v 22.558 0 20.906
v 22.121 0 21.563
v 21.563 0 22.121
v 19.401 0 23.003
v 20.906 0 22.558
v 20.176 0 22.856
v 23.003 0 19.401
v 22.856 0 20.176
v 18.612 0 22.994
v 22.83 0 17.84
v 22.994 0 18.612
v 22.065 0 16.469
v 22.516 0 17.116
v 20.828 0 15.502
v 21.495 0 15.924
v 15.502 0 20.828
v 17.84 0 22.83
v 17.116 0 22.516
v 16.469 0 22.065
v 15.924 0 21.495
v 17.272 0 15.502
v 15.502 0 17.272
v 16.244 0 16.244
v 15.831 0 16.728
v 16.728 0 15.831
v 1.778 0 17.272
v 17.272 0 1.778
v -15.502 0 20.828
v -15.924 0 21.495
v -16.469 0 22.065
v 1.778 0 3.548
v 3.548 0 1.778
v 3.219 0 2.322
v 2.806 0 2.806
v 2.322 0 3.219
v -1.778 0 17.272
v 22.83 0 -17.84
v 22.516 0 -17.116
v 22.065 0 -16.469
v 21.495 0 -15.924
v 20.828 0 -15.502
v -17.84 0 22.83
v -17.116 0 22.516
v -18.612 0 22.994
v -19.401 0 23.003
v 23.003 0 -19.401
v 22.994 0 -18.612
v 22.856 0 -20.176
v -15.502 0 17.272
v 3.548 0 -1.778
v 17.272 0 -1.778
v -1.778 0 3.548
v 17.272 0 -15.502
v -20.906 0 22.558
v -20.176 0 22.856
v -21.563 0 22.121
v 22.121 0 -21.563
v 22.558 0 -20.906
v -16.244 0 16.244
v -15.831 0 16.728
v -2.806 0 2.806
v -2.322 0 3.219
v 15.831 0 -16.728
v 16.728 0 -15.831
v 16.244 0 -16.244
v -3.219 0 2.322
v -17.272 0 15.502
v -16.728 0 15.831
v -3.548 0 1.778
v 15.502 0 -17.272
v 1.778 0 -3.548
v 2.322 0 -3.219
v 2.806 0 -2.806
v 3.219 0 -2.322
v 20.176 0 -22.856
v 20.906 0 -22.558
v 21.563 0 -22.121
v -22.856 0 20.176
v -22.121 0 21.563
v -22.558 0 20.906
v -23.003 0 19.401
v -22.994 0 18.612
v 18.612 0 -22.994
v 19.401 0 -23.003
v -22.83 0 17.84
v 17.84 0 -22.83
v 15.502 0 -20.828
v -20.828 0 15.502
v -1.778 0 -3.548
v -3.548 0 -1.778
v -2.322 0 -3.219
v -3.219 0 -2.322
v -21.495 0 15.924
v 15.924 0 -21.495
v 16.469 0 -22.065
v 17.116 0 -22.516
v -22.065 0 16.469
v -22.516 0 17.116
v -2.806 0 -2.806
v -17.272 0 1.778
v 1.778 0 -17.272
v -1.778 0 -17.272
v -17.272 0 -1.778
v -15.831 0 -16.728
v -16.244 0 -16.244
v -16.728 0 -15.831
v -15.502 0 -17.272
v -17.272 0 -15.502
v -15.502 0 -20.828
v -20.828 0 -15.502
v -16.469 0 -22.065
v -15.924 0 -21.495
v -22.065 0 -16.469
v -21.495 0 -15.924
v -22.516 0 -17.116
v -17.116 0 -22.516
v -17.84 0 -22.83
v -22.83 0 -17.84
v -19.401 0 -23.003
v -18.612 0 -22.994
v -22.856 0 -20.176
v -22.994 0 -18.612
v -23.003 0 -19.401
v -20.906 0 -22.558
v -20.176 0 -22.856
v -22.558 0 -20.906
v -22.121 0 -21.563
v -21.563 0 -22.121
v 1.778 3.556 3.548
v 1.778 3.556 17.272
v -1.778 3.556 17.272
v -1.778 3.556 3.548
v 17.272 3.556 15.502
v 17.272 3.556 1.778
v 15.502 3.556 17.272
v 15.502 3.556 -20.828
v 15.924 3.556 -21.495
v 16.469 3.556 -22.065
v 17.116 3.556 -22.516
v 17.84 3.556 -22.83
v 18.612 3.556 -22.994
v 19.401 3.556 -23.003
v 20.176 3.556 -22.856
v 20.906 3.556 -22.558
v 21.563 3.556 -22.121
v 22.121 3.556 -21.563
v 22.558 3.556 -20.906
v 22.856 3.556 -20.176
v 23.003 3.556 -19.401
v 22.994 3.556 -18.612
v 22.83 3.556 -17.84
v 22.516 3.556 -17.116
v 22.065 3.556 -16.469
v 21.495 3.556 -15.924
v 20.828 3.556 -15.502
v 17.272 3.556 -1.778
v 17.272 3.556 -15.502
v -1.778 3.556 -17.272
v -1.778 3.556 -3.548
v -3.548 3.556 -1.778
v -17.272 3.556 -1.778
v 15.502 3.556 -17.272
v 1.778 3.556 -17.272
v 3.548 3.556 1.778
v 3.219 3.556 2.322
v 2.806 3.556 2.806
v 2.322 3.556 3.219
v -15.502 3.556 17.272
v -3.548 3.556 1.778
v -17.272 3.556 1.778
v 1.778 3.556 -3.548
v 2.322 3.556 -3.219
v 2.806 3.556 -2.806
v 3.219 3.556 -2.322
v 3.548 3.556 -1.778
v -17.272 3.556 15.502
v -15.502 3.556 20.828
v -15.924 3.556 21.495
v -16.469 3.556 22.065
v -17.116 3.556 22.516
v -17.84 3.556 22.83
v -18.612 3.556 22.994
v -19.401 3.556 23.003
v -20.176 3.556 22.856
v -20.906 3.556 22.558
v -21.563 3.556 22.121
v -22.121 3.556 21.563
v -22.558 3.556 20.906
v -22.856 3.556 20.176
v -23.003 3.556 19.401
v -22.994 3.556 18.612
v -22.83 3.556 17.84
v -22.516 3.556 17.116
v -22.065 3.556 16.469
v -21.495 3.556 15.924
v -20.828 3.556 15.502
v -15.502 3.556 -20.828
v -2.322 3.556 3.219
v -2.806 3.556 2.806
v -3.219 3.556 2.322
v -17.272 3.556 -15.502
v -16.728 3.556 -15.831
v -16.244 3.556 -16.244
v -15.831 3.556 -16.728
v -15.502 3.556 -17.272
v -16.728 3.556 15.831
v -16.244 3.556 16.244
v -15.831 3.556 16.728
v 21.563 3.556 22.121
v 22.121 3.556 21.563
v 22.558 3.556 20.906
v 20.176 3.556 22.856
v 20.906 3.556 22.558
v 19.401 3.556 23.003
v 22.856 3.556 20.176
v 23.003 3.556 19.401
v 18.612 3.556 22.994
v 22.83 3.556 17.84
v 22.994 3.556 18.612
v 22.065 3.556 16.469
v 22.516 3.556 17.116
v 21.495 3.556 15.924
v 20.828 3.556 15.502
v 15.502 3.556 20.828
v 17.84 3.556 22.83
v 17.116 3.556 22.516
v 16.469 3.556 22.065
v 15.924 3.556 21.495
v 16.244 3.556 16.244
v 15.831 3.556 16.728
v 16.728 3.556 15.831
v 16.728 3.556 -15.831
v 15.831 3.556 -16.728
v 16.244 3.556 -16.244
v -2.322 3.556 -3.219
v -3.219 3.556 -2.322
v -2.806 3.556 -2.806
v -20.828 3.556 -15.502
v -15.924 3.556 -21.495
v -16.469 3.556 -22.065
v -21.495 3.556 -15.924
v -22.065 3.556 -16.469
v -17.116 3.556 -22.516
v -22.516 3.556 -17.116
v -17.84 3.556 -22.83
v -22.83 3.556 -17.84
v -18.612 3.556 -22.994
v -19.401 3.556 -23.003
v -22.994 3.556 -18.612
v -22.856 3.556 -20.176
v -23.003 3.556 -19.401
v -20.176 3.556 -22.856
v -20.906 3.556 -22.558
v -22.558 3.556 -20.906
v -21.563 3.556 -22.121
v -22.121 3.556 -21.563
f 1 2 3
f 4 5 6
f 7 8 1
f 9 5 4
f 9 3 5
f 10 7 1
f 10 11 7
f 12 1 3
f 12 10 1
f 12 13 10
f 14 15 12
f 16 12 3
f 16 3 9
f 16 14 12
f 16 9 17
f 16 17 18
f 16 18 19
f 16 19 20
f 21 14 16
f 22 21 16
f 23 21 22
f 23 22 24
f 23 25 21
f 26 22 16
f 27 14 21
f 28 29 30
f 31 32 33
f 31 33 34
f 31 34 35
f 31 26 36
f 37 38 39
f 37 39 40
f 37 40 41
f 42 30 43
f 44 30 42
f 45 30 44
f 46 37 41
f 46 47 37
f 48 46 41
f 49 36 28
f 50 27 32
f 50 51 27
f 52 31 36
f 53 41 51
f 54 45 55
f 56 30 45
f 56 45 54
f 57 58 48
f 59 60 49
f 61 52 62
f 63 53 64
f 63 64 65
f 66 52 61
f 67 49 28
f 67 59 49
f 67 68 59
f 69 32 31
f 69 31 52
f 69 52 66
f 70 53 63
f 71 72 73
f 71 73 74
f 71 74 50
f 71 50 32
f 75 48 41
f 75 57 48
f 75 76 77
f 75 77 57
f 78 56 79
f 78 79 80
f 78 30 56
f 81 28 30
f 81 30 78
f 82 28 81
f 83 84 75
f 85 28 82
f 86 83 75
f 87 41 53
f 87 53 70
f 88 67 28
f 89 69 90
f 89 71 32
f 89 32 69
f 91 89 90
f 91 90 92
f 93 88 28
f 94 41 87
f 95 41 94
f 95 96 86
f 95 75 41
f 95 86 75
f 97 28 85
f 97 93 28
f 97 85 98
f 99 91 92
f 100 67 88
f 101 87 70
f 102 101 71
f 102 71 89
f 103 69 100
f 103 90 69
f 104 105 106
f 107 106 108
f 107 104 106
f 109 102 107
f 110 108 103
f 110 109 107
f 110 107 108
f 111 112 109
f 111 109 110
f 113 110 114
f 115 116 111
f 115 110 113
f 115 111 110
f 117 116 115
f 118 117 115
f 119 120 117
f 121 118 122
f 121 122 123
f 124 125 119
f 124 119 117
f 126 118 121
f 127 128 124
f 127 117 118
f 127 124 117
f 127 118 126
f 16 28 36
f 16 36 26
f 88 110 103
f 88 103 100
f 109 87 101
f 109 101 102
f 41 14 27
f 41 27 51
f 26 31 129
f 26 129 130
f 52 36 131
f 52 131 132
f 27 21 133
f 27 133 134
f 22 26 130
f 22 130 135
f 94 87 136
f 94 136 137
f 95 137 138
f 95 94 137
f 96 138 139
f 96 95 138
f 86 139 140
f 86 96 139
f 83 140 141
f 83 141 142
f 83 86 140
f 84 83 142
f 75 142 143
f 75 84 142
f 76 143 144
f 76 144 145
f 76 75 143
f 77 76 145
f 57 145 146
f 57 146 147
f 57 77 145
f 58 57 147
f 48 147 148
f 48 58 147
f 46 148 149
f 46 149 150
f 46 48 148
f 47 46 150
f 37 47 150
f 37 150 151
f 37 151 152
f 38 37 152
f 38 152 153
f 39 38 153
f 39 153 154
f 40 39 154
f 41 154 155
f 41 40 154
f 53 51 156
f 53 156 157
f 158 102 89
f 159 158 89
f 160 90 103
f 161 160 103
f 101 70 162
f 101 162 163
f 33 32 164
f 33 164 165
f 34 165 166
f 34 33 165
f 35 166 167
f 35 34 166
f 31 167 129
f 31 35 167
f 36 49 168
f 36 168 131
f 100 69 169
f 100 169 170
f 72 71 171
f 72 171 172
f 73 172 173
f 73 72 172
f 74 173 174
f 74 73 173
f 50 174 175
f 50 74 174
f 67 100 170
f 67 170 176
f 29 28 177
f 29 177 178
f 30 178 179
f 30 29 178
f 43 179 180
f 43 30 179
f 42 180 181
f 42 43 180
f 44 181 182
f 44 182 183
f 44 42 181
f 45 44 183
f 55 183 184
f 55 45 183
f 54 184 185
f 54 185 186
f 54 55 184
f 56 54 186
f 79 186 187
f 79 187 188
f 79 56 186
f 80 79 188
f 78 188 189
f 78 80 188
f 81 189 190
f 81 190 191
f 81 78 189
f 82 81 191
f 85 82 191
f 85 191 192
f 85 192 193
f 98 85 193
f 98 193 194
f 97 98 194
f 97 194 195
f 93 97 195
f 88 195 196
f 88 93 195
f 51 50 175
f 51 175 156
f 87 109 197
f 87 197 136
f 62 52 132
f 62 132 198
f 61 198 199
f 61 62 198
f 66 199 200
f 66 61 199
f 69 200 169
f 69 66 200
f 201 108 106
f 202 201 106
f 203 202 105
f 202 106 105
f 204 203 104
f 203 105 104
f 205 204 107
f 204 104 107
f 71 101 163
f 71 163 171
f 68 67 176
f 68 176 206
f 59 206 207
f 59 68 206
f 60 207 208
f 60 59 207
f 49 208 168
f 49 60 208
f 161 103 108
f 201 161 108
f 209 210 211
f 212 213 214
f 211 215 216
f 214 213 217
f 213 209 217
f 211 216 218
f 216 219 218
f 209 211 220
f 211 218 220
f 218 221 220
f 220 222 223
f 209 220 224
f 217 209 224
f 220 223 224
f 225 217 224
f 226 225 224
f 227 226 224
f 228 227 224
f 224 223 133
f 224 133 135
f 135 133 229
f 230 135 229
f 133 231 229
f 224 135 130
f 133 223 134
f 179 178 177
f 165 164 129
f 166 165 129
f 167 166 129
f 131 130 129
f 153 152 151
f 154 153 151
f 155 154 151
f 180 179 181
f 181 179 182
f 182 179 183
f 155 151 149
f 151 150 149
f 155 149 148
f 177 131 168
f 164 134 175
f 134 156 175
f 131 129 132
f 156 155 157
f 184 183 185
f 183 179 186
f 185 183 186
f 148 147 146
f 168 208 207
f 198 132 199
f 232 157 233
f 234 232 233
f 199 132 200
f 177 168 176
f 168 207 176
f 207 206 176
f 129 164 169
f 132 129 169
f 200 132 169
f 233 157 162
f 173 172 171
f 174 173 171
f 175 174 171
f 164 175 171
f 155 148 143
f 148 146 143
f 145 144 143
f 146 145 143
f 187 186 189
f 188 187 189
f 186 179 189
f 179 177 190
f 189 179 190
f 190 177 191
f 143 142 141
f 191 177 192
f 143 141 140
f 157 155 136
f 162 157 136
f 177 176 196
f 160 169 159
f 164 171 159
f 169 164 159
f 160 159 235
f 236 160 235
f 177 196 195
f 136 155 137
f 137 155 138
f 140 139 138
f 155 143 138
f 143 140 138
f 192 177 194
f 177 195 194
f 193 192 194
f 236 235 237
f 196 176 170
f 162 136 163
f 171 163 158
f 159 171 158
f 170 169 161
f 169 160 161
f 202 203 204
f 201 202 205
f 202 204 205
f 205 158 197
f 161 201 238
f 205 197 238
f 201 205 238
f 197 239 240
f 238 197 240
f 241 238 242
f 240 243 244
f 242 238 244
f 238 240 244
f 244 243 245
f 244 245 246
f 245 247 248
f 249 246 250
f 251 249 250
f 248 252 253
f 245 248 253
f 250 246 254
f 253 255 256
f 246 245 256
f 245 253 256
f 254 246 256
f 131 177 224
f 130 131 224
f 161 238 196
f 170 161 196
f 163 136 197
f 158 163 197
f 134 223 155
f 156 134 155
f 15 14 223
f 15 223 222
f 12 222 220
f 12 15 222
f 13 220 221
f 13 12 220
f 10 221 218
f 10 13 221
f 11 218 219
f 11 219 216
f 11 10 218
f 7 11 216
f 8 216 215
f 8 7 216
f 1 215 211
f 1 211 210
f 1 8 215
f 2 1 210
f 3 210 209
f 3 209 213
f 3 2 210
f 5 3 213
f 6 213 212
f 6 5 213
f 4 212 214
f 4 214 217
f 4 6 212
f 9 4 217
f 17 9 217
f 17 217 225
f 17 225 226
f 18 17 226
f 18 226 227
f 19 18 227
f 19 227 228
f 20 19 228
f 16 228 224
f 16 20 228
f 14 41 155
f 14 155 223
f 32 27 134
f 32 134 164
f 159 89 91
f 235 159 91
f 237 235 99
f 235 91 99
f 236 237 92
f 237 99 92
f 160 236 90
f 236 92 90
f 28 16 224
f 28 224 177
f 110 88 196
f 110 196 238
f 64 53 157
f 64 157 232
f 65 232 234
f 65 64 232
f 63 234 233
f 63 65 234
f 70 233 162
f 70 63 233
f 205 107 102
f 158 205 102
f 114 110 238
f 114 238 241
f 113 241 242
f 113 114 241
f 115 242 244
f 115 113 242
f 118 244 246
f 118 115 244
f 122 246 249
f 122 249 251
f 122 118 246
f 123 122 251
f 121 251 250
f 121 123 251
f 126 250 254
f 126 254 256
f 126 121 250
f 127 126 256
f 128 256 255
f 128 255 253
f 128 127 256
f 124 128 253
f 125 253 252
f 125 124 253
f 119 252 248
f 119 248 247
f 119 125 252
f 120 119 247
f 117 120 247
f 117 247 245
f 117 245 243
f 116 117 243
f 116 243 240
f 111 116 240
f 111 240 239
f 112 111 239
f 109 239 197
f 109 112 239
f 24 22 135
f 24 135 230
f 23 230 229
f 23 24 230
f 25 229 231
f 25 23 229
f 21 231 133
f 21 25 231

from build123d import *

# Parameters (mm, degrees)
BOSS_EXTRUDE1_DEPTH = 3.556


with BuildPart() as part:
    # Sketch2 → Boss-Extrude1 (new body)
    with BuildSketch(Plane(origin=(0, 0, 0), x_dir=(1, 0, 0), z_dir=(0, 1, 0))):
        with BuildLine():
            Line((15.501804323, -20.828), (-15.501804323, -20.828))
            ThreePointArc((-15.501804323, -20.828), (-21.856330038, -21.856330038), (-20.828, -15.501804323))
            Line((-20.828, -15.501804323), (-20.828, 15.501804323))
            ThreePointArc((-20.828, 15.501804323), (-21.856330038, 21.856330038), (-15.501804323, 20.828))
            Line((-15.501804323, 20.828), (15.501804323, 20.828))
            ThreePointArc((15.501804323, 20.828), (21.856330038, 21.856330038), (20.828, 15.501804323))
            Line((20.828, 15.501804323), (20.828, -15.501804323))
            ThreePointArc((20.828, -15.501804323), (21.856330038, -21.856330038), (15.501804323, -20.828))
        make_face()
        with BuildLine():
            Line((-15.501804323, -17.272), (-1.778, -17.272))
            Line((-1.778, -17.272), (-1.778, -3.548195677))
            ThreePointArc((-1.778, -3.548195677), (-2.806330038, -2.806330038), (-3.548195677, -1.778))
            Line((-3.548195677, -1.778), (-17.272, -1.778))
            Line((-17.272, -1.778), (-17.272, -15.501804323))
            ThreePointArc((-17.272, -15.501804323), (-16.243669962, -16.243669962), (-15.501804323, -17.272))
        make_face(mode=Mode.SUBTRACT)
        with BuildLine():
            Line((-15.501804323, 17.272), (-1.778, 17.272))
            Line((-1.778, 17.272), (-1.778, 3.548195677))
            ThreePointArc((-1.778, 3.548195677), (-2.806330038, 2.806330038), (-3.548195677, 1.778))
            Line((-3.548195677, 1.778), (-17.272, 1.778))
            Line((-17.272, 1.778), (-17.272, 15.501804323))
            ThreePointArc((-17.272, 15.501804323), (-16.243669962, 16.243669962), (-15.501804323, 17.272))
        make_face(mode=Mode.SUBTRACT)
        with BuildLine():
            Line((17.272, -15.501804323), (17.272, -1.778))
            Line((17.272, -1.778), (3.548195677, -1.778))
            ThreePointArc((3.548195677, -1.778), (2.806330038, -2.806330038), (1.778, -3.548195677))
            Line((1.778, -3.548195677), (1.778, -17.272))
            Line((1.778, -17.272), (15.501804323, -17.272))
            ThreePointArc((15.501804323, -17.272), (16.243669962, -16.243669962), (17.272, -15.501804323))
        make_face(mode=Mode.SUBTRACT)
        with BuildLine():
            Line((1.778, 17.272), (1.778, 3.548195677))
            ThreePointArc((1.778, 3.548195677), (2.806330038, 2.806330038), (3.548195677, 1.778))
            Line((3.548195677, 1.778), (17.272, 1.778))
            Line((17.272, 1.778), (17.272, 15.501804323))
            ThreePointArc((17.272, 15.501804323), (16.243669962, 16.243669962), (15.501804323, 17.272))
            Line((15.501804323, 17.272), (1.778, 17.272))
        make_face(mode=Mode.SUBTRACT)
    extrude(amount=BOSS_EXTRUDE1_DEPTH)


solid = part.part
